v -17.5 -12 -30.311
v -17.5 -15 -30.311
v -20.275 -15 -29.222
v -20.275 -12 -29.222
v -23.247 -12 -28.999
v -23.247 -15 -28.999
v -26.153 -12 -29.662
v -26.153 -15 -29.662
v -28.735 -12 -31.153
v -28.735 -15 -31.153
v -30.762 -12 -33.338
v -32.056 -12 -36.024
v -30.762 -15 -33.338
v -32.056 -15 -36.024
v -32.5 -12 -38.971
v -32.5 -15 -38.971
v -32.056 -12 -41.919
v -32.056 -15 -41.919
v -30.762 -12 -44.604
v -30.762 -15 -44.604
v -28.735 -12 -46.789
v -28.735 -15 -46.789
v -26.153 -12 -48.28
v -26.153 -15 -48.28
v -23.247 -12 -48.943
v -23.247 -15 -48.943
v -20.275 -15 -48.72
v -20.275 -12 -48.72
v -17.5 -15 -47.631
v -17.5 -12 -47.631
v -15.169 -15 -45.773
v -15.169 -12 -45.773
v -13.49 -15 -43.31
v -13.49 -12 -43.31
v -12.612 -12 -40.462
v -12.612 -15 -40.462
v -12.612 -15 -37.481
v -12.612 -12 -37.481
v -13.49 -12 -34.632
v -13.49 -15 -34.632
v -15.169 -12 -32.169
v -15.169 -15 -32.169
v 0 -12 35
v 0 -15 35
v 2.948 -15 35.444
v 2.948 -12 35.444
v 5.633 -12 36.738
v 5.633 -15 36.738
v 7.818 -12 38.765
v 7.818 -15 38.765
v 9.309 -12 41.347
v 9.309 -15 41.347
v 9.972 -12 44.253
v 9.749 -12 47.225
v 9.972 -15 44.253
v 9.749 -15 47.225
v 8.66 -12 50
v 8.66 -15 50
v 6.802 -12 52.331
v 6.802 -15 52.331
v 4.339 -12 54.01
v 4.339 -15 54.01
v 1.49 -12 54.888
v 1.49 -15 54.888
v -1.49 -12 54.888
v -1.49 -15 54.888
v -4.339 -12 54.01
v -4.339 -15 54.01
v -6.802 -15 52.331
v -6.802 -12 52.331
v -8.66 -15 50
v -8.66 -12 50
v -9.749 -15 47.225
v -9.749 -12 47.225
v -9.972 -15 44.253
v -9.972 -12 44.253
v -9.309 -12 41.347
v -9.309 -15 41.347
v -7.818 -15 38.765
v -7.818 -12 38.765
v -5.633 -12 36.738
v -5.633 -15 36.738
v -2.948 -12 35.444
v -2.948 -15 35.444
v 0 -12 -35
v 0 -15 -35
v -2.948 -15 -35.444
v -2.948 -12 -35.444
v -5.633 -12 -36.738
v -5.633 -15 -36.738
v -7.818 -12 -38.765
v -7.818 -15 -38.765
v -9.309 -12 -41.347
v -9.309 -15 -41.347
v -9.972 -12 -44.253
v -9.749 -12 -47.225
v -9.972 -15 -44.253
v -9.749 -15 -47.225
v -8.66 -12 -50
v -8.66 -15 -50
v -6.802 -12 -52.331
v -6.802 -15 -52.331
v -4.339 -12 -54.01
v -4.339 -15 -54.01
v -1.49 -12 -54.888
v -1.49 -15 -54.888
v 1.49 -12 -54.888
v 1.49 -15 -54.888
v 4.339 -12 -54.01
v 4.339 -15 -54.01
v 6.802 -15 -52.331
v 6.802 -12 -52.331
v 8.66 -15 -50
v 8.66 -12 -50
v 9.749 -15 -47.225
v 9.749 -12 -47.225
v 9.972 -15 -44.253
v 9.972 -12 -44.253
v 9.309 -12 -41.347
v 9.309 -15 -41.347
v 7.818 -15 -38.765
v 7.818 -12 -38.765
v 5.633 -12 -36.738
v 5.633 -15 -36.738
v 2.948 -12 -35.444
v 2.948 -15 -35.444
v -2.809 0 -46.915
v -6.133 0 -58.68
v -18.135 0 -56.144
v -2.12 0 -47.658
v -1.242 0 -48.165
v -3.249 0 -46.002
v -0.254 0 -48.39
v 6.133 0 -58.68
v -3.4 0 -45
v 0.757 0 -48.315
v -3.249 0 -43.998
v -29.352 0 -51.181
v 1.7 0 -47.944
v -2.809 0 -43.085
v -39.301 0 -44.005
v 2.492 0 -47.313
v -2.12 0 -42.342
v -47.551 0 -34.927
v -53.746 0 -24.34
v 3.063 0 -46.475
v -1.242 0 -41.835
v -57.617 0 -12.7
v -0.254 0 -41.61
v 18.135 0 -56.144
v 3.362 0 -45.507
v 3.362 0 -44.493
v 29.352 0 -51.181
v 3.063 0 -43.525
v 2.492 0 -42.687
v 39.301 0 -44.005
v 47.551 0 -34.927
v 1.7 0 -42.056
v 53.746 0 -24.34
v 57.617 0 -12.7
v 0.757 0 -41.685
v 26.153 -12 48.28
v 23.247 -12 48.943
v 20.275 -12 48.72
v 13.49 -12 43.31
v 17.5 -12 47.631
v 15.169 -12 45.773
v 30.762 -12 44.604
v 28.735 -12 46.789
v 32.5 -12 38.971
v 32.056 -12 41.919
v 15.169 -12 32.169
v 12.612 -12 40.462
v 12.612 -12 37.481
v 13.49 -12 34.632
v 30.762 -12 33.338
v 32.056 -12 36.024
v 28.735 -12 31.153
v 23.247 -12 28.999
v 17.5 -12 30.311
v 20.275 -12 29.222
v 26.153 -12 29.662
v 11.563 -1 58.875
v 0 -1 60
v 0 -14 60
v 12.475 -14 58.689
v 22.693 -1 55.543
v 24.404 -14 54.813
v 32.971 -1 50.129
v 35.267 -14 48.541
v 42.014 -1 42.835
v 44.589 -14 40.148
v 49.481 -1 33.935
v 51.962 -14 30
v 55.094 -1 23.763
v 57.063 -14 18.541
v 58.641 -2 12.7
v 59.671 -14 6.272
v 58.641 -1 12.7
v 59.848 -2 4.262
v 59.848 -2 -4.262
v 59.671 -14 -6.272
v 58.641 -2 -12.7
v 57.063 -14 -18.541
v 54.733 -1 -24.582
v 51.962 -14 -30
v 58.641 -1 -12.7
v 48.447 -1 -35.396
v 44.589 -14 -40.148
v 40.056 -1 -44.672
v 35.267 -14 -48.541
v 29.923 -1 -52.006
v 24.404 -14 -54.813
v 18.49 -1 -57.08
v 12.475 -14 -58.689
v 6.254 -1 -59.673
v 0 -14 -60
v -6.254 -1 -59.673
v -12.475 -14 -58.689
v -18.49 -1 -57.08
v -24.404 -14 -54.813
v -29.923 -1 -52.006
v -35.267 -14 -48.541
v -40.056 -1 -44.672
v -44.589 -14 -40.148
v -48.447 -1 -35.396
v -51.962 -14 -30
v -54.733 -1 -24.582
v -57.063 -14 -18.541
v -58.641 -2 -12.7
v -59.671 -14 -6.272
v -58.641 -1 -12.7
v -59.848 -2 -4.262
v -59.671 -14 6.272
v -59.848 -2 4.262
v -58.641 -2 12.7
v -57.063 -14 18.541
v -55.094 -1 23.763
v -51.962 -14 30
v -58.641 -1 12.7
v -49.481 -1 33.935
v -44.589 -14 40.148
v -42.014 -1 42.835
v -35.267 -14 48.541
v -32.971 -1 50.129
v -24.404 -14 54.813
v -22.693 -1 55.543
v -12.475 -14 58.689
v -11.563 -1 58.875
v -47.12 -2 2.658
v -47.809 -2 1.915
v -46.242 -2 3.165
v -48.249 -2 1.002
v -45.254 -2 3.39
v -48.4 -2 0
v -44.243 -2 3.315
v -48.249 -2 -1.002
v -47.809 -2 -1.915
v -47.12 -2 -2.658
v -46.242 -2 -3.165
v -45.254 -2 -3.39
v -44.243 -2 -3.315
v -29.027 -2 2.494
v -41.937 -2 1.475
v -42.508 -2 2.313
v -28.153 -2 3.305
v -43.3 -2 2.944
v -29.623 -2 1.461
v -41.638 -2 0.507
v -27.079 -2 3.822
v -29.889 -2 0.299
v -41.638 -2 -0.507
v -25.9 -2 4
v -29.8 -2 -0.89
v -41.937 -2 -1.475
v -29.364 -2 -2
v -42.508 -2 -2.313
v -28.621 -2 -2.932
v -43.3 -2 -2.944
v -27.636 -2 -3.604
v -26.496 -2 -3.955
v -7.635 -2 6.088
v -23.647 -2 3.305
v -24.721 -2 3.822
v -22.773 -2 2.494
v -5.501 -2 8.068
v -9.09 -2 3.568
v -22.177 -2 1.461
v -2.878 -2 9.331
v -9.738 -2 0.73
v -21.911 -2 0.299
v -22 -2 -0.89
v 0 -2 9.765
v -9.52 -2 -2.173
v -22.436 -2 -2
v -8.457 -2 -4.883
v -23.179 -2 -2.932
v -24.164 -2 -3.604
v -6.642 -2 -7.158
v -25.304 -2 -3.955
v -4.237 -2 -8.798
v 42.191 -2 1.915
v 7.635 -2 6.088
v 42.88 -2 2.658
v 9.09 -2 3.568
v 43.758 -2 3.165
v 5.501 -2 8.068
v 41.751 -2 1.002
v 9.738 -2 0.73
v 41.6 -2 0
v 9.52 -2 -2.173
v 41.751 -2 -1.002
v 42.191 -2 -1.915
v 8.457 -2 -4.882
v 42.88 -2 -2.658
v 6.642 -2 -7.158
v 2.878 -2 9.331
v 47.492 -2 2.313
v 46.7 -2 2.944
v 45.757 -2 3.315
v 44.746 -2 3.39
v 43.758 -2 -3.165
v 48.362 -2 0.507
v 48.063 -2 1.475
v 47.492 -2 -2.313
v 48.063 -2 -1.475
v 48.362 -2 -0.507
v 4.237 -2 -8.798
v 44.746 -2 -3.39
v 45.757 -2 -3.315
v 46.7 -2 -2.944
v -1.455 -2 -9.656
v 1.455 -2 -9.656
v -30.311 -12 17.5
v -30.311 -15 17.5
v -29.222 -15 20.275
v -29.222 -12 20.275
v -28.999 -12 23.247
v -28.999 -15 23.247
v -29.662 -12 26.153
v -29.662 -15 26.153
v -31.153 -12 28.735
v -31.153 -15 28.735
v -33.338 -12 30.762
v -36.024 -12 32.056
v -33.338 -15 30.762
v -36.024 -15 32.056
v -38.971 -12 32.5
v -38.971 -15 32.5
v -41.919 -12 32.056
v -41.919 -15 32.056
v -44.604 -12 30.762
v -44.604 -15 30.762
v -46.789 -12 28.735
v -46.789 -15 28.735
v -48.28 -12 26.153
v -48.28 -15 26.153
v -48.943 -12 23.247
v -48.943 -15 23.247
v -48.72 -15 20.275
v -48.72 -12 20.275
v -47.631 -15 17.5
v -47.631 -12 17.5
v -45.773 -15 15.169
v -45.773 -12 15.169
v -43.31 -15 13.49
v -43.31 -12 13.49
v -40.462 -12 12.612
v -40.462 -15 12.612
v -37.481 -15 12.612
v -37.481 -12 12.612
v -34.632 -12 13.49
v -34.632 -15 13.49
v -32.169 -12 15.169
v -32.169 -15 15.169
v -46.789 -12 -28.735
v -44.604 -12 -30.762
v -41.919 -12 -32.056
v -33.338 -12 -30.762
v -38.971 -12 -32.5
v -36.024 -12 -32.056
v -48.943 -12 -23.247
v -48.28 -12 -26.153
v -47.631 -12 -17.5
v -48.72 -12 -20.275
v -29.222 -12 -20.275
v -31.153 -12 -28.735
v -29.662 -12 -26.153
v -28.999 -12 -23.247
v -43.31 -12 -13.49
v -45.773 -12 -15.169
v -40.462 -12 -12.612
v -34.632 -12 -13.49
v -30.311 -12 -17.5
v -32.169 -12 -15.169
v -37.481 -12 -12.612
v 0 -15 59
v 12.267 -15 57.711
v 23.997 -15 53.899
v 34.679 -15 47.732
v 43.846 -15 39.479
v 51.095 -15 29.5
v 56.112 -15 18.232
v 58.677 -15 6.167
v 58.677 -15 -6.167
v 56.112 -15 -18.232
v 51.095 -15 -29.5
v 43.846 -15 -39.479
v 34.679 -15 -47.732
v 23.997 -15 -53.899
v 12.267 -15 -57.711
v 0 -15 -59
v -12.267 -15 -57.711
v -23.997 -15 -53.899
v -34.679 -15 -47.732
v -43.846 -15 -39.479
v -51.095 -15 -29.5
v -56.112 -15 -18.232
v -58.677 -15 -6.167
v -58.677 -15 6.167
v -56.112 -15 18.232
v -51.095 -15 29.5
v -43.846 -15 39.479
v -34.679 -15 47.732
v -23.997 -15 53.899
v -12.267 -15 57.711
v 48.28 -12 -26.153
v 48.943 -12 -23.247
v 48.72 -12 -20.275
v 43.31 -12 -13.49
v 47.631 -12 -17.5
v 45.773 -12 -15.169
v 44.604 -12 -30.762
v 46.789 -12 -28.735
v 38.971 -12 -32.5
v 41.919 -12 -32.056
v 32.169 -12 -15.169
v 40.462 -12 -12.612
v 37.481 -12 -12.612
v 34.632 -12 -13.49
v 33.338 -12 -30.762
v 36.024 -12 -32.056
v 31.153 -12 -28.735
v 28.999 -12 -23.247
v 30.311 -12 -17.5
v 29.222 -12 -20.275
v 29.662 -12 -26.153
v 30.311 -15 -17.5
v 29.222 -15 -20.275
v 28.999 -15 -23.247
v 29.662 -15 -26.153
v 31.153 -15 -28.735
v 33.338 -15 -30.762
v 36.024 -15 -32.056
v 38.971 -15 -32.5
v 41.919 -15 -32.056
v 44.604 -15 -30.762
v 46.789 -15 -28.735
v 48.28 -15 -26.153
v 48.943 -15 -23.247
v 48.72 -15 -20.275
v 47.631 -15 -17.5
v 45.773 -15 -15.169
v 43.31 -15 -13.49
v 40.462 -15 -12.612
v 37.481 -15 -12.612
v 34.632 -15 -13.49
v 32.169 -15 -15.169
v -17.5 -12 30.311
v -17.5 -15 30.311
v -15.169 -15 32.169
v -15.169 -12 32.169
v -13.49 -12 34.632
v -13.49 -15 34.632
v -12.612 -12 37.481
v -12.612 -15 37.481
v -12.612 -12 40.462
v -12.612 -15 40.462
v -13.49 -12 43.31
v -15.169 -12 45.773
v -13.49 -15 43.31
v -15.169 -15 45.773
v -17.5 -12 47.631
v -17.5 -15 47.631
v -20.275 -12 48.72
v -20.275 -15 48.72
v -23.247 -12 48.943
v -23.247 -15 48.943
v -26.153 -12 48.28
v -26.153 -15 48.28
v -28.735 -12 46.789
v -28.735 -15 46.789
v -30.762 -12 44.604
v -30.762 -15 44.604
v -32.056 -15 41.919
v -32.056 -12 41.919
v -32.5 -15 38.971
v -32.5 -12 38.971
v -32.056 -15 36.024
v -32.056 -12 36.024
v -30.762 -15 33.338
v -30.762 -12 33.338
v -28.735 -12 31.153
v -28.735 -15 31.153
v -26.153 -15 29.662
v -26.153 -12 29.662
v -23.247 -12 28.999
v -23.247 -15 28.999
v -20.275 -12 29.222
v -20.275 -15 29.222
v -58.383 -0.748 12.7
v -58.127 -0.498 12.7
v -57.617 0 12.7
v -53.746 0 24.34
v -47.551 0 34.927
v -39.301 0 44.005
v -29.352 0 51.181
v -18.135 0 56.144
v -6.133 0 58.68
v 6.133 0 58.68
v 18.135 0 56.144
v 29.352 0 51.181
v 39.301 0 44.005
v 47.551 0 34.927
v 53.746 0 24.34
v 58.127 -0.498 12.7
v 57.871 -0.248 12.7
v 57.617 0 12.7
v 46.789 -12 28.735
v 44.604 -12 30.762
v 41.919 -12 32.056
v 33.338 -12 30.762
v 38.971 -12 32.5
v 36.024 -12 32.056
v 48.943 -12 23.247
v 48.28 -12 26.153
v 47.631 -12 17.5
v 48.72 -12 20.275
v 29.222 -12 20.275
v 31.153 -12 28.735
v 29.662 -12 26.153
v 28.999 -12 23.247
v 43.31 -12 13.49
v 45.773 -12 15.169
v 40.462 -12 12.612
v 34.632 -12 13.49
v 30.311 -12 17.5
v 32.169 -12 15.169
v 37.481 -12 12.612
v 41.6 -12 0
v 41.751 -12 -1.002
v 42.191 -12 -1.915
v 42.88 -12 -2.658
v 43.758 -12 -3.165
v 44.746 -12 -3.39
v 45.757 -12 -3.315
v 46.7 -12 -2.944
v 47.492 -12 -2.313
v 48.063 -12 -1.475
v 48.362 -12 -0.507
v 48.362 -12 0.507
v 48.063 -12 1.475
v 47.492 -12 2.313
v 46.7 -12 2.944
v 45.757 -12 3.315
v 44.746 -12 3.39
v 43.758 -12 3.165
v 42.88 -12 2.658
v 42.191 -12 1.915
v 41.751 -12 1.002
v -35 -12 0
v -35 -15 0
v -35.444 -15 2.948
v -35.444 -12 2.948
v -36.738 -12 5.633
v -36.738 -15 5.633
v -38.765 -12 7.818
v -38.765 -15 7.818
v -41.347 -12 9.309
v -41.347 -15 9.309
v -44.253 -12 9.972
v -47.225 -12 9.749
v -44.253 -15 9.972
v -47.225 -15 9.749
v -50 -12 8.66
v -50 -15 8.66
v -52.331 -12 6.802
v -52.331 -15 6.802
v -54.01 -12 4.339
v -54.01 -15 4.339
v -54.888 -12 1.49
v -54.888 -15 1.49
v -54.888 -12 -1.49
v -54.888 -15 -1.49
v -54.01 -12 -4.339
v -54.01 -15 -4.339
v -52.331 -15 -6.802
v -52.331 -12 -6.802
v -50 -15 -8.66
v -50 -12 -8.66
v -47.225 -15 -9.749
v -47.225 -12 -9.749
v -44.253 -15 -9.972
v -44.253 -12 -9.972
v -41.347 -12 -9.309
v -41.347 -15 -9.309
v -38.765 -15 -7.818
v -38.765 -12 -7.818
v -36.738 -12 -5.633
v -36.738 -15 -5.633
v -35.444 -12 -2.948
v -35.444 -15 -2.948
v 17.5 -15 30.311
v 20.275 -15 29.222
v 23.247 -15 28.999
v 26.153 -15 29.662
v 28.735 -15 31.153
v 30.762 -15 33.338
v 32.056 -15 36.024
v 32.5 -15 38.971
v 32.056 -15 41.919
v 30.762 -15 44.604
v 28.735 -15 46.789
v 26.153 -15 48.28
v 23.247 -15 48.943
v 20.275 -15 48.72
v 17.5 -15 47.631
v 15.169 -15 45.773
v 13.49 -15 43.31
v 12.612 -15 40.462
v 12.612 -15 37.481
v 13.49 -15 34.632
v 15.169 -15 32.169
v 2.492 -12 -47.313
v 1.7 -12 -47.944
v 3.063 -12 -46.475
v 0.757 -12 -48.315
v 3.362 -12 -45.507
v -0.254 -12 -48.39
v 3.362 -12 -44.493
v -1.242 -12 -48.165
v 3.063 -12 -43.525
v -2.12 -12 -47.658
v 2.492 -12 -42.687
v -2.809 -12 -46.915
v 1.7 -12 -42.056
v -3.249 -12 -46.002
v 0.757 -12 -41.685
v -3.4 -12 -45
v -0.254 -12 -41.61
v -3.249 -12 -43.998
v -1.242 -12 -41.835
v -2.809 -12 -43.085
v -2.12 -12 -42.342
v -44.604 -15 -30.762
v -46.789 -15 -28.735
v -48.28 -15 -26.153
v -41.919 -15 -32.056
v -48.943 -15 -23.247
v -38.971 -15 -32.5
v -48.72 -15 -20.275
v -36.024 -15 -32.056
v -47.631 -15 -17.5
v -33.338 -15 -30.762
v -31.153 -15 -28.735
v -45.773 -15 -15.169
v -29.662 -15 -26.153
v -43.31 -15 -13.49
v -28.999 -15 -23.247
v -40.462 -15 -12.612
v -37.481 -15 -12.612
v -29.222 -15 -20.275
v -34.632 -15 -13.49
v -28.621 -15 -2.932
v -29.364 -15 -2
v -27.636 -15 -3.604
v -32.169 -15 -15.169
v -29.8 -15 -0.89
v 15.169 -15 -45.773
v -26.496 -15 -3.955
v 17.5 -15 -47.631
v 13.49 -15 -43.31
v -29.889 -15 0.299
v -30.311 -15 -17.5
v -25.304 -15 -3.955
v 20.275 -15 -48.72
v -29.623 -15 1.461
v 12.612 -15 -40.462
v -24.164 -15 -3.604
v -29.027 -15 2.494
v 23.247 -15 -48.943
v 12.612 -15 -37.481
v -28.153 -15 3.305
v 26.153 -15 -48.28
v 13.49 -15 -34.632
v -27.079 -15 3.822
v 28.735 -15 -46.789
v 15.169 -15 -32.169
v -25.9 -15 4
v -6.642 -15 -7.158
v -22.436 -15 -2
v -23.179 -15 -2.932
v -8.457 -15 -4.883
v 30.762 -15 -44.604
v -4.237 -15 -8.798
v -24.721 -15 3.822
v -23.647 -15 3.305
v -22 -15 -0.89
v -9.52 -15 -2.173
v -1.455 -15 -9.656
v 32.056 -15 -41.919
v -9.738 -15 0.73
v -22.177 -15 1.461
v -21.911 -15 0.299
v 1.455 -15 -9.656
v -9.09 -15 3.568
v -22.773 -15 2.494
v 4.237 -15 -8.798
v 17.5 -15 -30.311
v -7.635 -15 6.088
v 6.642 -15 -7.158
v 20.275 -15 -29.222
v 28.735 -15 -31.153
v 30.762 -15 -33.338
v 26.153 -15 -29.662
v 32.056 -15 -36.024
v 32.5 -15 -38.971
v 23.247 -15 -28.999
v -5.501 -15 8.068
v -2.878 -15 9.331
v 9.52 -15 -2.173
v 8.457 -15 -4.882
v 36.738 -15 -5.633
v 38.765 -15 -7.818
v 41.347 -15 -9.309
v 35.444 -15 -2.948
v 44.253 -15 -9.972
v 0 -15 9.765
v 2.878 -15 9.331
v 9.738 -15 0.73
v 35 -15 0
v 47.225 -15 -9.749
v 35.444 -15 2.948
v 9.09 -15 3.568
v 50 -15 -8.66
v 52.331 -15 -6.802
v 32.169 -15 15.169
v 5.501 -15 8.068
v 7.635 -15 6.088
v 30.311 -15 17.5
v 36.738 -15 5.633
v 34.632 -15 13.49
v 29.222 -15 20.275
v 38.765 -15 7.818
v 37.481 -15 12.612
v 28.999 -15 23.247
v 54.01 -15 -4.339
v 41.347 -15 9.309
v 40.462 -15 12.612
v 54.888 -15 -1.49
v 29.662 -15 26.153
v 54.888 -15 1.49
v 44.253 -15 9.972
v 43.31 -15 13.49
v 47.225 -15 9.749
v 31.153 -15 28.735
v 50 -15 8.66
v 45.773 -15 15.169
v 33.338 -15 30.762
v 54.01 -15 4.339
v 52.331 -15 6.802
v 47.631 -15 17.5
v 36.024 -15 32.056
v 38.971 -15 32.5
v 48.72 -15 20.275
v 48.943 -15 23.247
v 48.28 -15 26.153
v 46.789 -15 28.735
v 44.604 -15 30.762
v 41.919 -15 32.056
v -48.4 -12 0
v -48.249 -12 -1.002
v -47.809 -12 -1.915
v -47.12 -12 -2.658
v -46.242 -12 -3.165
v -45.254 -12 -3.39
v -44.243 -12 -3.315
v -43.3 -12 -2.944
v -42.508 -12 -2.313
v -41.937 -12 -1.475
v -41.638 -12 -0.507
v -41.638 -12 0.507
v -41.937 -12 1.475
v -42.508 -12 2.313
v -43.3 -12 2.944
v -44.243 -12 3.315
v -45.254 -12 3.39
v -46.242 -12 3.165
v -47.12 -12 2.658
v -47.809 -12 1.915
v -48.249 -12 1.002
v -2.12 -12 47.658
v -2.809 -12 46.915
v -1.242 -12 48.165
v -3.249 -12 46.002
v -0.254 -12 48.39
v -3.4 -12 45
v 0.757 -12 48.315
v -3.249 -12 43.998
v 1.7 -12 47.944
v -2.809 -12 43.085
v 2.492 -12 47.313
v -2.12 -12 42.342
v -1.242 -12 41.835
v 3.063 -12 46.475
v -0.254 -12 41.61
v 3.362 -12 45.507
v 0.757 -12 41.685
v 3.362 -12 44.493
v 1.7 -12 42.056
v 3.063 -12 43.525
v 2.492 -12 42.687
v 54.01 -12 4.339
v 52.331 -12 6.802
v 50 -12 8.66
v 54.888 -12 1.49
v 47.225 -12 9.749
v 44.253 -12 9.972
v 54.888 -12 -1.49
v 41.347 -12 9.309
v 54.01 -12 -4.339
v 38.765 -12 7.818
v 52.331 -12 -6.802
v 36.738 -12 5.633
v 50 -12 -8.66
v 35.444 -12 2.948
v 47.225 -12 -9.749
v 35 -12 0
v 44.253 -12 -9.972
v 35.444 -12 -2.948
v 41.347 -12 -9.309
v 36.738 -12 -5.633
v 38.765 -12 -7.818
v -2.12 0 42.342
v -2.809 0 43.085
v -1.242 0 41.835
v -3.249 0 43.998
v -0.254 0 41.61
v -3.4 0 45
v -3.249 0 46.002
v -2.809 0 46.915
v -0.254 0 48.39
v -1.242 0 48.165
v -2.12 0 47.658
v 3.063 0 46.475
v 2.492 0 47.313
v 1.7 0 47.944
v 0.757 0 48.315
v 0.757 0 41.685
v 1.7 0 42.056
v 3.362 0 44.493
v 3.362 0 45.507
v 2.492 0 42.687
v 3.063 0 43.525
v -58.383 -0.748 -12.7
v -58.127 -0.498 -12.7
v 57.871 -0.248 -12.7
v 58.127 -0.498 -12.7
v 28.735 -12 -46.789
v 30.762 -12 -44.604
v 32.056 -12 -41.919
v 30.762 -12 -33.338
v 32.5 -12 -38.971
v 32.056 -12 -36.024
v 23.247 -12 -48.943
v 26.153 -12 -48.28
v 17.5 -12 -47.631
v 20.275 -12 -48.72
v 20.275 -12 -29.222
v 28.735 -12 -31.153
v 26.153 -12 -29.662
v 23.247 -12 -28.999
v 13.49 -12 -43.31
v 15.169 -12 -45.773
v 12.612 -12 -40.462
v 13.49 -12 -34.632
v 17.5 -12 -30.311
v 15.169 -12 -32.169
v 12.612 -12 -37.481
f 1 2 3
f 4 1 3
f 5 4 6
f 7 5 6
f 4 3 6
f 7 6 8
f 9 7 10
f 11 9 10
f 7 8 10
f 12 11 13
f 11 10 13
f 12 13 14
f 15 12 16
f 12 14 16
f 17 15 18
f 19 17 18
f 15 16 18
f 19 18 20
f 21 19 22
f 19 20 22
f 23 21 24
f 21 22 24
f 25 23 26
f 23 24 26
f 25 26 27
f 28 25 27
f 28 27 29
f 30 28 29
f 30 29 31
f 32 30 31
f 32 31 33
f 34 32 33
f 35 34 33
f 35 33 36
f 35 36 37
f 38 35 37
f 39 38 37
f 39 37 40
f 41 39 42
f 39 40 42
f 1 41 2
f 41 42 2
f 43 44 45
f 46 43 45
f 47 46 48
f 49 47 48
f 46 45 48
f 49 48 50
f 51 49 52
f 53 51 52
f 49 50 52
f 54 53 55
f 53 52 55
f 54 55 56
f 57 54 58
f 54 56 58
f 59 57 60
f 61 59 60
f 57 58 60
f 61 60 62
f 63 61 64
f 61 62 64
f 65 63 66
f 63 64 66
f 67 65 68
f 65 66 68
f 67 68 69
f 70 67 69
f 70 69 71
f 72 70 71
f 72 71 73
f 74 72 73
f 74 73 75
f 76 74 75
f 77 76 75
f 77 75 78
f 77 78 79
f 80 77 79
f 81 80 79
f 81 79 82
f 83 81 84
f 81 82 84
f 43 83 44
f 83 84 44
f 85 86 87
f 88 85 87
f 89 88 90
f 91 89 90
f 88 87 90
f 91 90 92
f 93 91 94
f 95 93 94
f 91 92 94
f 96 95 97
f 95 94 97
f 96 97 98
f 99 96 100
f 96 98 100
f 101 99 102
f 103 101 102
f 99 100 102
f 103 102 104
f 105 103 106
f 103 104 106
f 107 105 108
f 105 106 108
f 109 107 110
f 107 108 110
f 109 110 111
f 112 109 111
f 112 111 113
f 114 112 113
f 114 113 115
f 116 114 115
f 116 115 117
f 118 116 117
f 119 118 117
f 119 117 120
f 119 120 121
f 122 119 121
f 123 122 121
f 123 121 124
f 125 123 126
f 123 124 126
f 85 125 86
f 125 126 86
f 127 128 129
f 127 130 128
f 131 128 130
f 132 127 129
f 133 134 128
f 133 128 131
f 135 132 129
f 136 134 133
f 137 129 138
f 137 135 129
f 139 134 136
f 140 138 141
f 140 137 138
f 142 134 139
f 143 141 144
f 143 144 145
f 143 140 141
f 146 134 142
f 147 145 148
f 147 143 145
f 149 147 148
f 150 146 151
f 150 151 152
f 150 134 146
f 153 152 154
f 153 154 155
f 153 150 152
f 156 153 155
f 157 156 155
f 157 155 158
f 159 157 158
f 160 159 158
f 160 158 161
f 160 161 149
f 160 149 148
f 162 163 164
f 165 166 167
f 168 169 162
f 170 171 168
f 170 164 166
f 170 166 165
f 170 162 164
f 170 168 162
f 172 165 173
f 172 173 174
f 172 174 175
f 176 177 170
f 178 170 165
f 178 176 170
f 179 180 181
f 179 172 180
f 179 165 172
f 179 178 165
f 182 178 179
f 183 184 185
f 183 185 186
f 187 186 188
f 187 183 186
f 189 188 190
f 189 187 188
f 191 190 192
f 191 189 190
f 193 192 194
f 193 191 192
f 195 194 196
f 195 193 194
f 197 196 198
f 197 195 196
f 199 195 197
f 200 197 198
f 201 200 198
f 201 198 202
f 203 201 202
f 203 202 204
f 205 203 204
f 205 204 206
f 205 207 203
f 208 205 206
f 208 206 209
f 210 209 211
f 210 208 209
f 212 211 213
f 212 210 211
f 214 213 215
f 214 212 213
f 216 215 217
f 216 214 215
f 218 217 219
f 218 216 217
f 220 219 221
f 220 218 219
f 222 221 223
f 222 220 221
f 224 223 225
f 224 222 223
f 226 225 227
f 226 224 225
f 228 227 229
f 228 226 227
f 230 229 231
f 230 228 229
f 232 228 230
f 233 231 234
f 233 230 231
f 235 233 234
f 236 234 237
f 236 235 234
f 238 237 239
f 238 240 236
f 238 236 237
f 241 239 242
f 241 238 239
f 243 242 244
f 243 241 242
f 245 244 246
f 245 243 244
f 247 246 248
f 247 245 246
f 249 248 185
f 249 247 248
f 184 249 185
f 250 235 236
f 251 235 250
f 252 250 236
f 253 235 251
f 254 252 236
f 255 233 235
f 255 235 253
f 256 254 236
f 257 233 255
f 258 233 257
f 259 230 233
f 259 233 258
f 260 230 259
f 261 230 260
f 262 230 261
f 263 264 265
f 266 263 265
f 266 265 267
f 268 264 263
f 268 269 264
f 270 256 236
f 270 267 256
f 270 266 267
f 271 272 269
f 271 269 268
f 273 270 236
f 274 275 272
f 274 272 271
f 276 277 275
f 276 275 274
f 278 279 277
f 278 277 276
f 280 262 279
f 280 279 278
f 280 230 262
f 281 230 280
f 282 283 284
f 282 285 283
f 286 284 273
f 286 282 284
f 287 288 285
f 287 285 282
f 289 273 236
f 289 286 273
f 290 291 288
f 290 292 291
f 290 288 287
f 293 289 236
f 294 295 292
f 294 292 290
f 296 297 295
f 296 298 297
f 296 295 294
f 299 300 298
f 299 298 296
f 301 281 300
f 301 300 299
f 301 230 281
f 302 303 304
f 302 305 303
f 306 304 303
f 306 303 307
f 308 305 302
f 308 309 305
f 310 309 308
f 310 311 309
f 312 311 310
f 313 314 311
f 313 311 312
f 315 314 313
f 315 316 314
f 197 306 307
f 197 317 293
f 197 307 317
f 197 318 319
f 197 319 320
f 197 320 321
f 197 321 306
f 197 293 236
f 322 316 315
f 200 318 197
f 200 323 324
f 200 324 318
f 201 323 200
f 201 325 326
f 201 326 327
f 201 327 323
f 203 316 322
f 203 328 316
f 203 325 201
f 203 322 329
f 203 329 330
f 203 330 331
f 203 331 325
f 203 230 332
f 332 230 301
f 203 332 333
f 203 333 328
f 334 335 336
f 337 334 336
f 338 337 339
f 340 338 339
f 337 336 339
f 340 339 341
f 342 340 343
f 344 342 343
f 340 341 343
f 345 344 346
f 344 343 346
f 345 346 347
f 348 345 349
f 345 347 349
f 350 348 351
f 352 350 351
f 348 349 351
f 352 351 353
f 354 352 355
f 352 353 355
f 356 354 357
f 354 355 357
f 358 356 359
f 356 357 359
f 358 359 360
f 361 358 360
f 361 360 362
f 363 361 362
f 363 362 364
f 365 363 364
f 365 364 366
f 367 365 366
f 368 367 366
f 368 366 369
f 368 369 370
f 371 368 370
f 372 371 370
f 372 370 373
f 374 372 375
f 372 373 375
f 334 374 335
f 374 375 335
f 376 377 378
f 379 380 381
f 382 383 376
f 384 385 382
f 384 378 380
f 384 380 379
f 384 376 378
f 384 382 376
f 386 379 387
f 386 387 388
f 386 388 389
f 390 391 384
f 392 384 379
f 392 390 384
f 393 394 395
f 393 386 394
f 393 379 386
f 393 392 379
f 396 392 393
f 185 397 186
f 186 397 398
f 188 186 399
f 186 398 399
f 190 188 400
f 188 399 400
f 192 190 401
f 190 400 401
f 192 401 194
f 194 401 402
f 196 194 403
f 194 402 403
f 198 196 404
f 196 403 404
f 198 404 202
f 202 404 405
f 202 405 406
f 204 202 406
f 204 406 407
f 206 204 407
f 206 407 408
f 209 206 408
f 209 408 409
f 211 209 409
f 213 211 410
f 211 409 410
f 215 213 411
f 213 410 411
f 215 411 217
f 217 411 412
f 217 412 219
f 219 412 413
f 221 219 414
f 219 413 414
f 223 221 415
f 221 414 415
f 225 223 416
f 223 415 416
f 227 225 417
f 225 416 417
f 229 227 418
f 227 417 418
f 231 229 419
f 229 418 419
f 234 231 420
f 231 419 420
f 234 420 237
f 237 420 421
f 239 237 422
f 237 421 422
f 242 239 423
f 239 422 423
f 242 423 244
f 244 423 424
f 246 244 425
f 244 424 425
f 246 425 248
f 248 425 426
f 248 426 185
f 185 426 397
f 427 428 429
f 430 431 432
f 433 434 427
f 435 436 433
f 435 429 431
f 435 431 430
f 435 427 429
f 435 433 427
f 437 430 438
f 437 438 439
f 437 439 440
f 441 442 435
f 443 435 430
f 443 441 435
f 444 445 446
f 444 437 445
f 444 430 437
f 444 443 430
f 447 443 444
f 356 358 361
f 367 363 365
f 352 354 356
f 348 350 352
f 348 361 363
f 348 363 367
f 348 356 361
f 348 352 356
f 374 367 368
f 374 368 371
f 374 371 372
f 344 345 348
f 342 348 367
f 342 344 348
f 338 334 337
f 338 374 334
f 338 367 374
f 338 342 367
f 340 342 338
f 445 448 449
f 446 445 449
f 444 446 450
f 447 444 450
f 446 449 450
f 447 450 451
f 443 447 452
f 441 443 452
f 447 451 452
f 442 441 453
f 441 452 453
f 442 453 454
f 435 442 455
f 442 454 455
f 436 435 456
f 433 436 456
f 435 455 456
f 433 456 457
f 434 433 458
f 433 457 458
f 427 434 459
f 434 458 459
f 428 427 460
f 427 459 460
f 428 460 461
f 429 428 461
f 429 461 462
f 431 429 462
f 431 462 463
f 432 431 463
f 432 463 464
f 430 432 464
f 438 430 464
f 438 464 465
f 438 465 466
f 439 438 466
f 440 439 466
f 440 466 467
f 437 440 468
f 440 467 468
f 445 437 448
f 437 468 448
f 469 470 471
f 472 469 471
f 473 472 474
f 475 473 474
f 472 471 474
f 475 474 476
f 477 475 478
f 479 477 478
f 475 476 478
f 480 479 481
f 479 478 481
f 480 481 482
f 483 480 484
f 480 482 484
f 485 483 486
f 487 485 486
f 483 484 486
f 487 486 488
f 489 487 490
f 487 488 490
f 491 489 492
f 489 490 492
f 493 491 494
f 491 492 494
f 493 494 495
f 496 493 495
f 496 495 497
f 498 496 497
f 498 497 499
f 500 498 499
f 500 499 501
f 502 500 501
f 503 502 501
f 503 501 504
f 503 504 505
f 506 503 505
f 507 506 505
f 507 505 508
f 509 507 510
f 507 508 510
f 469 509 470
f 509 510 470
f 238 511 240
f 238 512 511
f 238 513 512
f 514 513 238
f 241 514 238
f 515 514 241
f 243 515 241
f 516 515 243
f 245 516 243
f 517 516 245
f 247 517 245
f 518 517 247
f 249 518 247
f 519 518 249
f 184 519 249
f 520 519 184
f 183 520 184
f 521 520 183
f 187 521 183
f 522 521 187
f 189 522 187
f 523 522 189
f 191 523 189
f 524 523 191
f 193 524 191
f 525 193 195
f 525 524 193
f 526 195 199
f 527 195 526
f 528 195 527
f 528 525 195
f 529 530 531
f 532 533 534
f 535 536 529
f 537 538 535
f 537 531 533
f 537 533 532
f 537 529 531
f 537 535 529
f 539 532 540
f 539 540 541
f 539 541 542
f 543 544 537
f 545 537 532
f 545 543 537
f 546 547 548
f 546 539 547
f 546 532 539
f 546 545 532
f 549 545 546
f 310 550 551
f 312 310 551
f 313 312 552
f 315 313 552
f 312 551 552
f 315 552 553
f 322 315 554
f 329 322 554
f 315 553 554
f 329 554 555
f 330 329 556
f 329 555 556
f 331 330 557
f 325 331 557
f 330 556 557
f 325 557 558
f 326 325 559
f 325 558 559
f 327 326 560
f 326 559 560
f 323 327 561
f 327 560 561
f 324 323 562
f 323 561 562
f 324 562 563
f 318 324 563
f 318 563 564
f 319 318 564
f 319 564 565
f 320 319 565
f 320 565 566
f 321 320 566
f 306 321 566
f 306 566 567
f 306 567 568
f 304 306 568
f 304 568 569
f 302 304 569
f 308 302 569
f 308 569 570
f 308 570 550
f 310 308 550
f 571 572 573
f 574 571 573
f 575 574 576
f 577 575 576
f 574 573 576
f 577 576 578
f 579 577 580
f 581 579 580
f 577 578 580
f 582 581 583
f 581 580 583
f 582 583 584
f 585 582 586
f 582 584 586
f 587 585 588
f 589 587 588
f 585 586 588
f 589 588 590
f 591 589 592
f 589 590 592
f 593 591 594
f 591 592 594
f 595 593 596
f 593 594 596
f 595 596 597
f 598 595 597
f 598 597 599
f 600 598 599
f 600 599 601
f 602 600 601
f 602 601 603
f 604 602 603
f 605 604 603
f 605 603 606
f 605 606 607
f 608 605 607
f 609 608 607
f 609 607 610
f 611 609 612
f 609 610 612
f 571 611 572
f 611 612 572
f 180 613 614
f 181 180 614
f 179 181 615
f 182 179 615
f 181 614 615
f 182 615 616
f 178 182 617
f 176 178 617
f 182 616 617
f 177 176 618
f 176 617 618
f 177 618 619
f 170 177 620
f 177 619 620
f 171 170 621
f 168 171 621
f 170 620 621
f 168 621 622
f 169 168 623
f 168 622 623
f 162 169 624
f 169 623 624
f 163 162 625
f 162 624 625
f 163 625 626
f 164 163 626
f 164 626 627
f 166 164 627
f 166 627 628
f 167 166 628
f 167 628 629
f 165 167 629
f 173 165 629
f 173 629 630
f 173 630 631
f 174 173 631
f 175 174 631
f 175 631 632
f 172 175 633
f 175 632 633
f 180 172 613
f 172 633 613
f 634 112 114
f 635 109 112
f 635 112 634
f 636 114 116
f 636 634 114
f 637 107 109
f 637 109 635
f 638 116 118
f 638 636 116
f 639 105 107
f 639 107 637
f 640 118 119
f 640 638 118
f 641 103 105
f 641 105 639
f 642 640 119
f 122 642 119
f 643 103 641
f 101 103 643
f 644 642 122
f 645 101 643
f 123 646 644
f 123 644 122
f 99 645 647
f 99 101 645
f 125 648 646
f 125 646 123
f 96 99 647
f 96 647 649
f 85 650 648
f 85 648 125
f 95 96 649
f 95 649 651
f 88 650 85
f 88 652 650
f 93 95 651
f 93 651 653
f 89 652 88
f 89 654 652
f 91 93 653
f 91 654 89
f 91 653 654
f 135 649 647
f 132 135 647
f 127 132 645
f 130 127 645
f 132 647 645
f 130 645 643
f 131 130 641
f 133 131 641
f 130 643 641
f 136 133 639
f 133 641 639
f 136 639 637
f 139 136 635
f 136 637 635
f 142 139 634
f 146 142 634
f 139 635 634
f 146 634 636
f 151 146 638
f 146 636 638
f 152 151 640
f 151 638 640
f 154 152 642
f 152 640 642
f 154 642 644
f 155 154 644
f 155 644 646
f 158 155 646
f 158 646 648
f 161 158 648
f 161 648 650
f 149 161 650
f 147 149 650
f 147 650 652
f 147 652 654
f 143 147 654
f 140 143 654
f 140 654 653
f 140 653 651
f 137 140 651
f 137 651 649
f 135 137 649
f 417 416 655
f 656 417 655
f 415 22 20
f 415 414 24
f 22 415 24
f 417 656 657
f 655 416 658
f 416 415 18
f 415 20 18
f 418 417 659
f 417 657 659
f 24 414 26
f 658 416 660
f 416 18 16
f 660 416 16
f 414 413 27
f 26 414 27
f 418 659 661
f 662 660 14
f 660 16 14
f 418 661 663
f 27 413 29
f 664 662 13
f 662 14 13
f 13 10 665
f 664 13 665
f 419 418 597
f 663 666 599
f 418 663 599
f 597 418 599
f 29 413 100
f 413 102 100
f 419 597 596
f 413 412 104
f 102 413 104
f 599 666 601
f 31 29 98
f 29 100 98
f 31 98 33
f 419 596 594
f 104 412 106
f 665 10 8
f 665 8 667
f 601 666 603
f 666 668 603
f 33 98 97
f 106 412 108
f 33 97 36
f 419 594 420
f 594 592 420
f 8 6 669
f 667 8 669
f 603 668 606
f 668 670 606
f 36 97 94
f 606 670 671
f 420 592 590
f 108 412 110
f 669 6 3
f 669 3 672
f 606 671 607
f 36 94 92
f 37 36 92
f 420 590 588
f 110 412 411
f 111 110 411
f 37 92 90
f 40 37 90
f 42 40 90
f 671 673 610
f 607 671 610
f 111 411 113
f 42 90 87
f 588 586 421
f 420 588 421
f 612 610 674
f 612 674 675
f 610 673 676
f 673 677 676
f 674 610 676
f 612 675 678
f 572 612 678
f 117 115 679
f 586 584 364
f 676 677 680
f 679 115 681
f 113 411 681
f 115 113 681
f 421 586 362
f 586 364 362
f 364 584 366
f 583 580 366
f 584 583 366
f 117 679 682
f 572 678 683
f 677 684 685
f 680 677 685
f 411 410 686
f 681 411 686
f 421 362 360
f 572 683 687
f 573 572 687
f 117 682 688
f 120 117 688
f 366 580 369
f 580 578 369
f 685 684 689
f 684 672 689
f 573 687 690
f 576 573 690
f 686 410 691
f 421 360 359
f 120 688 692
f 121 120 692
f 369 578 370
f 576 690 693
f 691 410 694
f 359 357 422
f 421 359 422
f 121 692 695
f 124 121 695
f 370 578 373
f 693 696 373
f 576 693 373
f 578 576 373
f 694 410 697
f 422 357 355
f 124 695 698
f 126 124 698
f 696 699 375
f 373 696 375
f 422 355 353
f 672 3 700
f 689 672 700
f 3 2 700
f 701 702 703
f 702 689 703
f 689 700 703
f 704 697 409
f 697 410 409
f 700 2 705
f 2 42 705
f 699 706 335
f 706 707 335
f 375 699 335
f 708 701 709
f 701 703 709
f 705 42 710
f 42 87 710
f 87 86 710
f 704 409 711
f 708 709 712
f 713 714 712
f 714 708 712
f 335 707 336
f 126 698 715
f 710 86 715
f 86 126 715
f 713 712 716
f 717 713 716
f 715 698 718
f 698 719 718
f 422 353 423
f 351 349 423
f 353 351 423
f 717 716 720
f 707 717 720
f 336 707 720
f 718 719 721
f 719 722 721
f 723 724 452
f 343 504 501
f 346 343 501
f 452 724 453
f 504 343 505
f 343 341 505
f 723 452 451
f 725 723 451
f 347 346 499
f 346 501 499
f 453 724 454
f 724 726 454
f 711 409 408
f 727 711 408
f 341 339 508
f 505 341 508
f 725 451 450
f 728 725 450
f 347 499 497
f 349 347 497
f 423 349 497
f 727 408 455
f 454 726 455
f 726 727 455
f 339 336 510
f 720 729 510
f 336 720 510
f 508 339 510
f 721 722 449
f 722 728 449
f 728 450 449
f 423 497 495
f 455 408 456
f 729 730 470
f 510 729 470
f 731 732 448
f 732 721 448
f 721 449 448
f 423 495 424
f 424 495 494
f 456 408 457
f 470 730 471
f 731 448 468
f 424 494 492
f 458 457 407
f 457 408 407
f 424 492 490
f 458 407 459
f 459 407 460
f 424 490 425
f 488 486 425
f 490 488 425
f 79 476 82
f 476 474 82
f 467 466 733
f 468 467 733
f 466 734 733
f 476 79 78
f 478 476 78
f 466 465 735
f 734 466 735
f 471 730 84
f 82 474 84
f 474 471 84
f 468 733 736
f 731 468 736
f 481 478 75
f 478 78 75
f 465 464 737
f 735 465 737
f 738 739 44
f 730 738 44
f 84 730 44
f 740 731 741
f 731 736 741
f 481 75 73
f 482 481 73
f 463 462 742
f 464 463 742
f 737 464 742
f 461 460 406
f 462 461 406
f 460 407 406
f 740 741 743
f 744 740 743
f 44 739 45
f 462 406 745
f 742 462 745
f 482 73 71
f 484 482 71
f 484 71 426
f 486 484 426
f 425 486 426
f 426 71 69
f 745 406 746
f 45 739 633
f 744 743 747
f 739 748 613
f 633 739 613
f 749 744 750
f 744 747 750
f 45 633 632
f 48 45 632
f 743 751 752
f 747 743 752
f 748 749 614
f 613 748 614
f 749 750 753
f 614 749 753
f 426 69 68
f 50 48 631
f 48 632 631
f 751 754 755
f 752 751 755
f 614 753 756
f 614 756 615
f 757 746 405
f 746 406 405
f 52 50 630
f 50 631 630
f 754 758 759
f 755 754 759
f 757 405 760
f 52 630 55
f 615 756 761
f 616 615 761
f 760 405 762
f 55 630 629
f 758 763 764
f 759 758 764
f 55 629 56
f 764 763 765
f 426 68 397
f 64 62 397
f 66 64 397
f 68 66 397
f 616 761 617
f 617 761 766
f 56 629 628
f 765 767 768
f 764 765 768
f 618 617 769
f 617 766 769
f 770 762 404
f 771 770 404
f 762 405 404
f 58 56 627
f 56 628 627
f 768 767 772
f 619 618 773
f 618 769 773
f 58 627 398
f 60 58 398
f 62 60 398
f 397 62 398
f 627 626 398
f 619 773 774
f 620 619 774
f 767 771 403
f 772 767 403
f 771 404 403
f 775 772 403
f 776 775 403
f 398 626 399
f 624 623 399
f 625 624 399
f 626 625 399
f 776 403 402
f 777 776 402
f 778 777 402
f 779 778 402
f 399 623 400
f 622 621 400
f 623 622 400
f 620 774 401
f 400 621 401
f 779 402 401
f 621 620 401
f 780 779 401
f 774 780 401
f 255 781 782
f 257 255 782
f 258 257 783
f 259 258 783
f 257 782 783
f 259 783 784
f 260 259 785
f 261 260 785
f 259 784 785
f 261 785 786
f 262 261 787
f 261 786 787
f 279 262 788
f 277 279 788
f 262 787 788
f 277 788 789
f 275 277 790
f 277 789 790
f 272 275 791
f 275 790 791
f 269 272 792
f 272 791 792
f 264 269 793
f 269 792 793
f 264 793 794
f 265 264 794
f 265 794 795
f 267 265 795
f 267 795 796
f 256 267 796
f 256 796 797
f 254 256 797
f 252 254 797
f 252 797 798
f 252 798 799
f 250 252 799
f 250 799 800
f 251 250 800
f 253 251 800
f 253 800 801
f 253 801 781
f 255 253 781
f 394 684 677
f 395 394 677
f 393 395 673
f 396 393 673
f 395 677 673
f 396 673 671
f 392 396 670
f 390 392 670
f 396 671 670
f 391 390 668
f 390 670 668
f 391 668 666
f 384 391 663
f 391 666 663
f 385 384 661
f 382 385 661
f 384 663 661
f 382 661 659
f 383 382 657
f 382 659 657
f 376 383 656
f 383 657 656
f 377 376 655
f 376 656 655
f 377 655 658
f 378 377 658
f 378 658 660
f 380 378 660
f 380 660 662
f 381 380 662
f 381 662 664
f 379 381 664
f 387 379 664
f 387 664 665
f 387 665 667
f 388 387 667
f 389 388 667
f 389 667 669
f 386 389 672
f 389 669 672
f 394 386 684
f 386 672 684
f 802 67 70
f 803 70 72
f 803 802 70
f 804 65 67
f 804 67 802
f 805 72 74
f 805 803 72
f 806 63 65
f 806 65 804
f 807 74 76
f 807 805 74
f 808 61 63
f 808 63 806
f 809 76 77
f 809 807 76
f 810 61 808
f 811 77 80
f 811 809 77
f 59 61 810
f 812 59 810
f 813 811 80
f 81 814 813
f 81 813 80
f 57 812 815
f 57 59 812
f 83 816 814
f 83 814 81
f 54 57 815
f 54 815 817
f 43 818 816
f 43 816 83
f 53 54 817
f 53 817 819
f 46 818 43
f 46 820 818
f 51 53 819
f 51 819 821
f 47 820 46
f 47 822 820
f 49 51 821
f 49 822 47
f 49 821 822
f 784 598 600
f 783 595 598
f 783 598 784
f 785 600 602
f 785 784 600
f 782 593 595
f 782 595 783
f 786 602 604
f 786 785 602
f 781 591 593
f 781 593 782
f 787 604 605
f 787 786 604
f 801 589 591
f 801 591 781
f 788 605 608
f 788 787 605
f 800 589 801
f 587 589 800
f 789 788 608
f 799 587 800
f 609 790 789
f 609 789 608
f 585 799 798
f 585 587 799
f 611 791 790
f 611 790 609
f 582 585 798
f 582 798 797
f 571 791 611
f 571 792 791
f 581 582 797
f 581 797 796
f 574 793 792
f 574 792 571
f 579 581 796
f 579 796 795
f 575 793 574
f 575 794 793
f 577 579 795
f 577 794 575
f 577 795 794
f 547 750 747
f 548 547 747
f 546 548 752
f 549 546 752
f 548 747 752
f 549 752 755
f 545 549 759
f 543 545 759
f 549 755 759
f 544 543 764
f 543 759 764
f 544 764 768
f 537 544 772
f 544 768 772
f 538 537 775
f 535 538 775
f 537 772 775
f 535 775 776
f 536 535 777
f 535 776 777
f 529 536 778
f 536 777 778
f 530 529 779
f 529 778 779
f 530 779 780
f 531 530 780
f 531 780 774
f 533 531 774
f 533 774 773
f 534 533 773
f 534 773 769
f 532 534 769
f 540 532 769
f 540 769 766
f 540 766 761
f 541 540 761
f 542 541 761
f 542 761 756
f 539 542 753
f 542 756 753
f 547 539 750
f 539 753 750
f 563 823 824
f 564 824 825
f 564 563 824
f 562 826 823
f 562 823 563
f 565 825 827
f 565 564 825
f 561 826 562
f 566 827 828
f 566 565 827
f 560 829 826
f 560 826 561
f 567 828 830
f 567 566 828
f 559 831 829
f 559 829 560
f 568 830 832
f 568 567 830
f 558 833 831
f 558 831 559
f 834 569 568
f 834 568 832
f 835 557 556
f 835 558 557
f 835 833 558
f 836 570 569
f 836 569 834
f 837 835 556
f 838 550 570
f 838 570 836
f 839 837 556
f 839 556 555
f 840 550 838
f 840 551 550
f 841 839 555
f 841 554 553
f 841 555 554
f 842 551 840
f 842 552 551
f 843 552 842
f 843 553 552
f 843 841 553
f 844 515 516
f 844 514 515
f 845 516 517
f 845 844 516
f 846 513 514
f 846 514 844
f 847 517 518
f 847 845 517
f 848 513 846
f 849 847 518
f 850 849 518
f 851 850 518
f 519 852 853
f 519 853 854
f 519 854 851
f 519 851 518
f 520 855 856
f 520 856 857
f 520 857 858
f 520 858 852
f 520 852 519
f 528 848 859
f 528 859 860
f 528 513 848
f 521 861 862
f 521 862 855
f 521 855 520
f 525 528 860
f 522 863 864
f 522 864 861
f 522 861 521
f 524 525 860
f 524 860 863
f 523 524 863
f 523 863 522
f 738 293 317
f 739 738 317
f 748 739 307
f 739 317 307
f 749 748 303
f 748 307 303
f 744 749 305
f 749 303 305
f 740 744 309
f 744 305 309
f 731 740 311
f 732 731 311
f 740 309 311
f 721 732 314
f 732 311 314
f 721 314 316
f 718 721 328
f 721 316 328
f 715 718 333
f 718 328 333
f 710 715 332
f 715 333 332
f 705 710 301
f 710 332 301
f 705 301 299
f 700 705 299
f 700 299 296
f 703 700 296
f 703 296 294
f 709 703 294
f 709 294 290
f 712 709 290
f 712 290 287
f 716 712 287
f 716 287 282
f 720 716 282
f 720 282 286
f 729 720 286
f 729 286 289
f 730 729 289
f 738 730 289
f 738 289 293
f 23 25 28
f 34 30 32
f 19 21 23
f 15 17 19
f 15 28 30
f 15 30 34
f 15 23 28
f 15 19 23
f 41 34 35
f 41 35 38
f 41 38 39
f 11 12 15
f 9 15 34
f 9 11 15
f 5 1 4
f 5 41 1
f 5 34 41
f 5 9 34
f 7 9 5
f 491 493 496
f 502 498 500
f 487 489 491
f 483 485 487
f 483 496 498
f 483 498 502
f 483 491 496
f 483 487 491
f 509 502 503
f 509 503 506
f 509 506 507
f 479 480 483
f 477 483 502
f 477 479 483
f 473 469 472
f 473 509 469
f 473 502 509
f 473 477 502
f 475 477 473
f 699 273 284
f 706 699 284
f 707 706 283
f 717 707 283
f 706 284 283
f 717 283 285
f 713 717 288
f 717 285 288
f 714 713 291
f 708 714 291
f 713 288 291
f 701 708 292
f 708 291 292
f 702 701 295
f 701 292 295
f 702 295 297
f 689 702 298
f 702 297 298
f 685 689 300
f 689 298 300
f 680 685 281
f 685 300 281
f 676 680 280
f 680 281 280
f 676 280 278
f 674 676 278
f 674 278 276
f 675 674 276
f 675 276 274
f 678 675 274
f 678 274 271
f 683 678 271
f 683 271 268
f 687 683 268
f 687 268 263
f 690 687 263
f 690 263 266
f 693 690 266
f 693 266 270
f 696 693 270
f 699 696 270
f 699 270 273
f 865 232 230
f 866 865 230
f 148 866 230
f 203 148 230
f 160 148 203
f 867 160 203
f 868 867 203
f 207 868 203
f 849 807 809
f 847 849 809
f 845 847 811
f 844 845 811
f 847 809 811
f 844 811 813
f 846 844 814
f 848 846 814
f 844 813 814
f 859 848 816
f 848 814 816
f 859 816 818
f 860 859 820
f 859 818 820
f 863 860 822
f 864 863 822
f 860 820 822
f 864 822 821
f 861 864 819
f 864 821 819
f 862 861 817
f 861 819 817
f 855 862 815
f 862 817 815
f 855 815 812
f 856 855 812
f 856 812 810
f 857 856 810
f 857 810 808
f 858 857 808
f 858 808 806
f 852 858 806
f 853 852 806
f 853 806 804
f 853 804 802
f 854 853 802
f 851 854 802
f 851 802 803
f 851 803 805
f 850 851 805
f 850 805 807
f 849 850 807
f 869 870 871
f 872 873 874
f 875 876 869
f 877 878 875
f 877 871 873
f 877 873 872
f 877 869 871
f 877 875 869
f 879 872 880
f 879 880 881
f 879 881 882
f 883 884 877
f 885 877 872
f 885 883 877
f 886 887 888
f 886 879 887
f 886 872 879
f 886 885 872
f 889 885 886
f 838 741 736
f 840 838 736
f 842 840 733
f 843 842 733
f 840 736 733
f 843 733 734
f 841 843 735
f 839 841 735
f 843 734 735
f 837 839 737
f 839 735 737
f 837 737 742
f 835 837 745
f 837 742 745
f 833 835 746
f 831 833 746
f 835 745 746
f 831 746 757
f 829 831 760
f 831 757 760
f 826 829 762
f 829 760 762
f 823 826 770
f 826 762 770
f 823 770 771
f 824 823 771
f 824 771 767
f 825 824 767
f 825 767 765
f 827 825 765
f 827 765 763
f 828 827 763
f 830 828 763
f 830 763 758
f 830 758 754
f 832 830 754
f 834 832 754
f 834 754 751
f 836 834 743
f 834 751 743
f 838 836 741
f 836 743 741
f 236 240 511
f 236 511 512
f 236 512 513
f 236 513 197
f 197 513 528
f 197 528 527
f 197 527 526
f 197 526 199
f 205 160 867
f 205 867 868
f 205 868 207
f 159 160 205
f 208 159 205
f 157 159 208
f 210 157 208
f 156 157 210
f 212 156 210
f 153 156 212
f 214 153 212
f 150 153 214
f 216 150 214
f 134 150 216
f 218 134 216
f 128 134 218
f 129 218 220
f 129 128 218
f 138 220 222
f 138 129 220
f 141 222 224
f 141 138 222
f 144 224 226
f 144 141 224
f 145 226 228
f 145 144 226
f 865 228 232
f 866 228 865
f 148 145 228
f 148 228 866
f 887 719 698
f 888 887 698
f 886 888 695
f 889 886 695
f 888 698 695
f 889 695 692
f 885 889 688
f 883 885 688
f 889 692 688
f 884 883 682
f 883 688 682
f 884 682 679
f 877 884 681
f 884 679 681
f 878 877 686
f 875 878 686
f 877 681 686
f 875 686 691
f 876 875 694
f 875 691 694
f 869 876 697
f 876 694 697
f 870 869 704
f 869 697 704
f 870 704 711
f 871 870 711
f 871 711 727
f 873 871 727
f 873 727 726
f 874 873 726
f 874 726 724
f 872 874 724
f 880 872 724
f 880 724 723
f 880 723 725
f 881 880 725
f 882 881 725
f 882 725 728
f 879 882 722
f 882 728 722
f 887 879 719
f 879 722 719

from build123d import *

# Parameters (mm, degrees)
SKETCH1_R                      = 60
SKETCH1_R_2                    = 9.765
BOSS_EXTRUDE1_DEPTH            = 15
CHAMFER1_SIZE                  = 1
M8_TAPPED_HOLE1_D              = 6.8
SKETCH5_R                      = 10
CUT_EXTRUDE1_DEPTH             = 3
CIRPATTERN1_COUNT              = 12
SKETCH7_W                      = 120
SKETCH7_H                      = 25.4
CUT_EXTRUDE2_DEPTH             = 2
CUT_EXTRUDE3_REACH             = 88.168
SKETCH8_R                      = 4
CUT_EXTRUDE3_DIRECTION_2_DEPTH = 87.168439698


with BuildPart() as part:
    # Sketch1 → Boss-Extrude1 (new body)
    with BuildSketch(Plane(origin=(0, 0, 0), x_dir=(1, 0, 0), z_dir=(0, 1, 0))):
        with Locations(Location((0, 0, 0), (0, 0, 270))):
            Circle(SKETCH1_R)
        with Locations(Location((0, 0, 0), (0, 0, 270))):
            Circle(SKETCH1_R_2, mode=Mode.SUBTRACT)
    extrude(amount=-BOSS_EXTRUDE1_DEPTH)

    # Chamfer1
    chamfer1_edges = [part.edges().sort_by_distance(p)[0] for p in [
        (0, 0, -60),
        (0, -15, -60),
    ]]
    chamfer(chamfer1_edges, length=CHAMFER1_SIZE)

    # M8 Tapped Hole1 (through all)
    with Locations(Plane(origin=(0, 0, 0), x_dir=(1, 0, 0), z_dir=(0, 1, 0))):
        with Locations((-45, 0), (0, -45), (0, 45), (45, 0)):
            Hole(M8_TAPPED_HOLE1_D / 2)

    # Sketch5 → Cut-Extrude1 (cut)
    with BuildSketch(Plane.XZ.offset(15)):
        with Locations(Location((0, 45, 0), (0, 0, 270))):
            Circle(SKETCH5_R)
    cut_extrude1 = extrude(amount=-CUT_EXTRUDE1_DEPTH, mode=Mode.SUBTRACT)

    # CirPattern1: Cut-Extrude1 ×12 about axis
    cirpattern1_axis = Axis((0, 0, 0), (0, 1, 0))
    for i in range(1, CIRPATTERN1_COUNT):
        add(cut_extrude1.rotate(cirpattern1_axis, i * 360 / CIRPATTERN1_COUNT), mode=Mode.SUBTRACT)

    # Sketch7 → Cut-Extrude2 (cut)
    with BuildSketch(Plane(origin=(0, 0, 0), x_dir=(1, 0, 0), z_dir=(0, 1, 0))):
        Rectangle(SKETCH7_W, SKETCH7_H)
    extrude(amount=-CUT_EXTRUDE2_DEPTH, mode=Mode.SUBTRACT)

    # Sketch8 → Cut-Extrude3 (cut, up to next)
    with BuildSketch(Plane(origin=(0, 0, 0), x_dir=(1, 0, 0), z_dir=(0, 1, 0)), mode=Mode.PRIVATE) as cut_extrude3_sk1:
        with Locations(Location((-25.9, 0, 0), (0, 0, 270))):
            Circle(SKETCH8_R)
    cut_extrude3_tool1 = extrude(cut_extrude3_sk1.sketch, amount=-CUT_EXTRUDE3_REACH, mode=Mode.PRIVATE) & part.part
    add(cut_extrude3_tool1.solids().sort_by_distance((-25.9, 0, 0))[0], mode=Mode.SUBTRACT)

    # Sketch8 → Cut-Extrude3 direction 2 (cut)
    with BuildSketch(Plane(origin=(0, 0, 0), x_dir=(1, 0, 0), z_dir=(0, 1, 0))):
        with Locations(Location((-25.9, 0, 0), (0, 0, 270))):
            Circle(SKETCH8_R)
    extrude(amount=CUT_EXTRUDE3_DIRECTION_2_DEPTH, mode=Mode.SUBTRACT)


solid = part.part
